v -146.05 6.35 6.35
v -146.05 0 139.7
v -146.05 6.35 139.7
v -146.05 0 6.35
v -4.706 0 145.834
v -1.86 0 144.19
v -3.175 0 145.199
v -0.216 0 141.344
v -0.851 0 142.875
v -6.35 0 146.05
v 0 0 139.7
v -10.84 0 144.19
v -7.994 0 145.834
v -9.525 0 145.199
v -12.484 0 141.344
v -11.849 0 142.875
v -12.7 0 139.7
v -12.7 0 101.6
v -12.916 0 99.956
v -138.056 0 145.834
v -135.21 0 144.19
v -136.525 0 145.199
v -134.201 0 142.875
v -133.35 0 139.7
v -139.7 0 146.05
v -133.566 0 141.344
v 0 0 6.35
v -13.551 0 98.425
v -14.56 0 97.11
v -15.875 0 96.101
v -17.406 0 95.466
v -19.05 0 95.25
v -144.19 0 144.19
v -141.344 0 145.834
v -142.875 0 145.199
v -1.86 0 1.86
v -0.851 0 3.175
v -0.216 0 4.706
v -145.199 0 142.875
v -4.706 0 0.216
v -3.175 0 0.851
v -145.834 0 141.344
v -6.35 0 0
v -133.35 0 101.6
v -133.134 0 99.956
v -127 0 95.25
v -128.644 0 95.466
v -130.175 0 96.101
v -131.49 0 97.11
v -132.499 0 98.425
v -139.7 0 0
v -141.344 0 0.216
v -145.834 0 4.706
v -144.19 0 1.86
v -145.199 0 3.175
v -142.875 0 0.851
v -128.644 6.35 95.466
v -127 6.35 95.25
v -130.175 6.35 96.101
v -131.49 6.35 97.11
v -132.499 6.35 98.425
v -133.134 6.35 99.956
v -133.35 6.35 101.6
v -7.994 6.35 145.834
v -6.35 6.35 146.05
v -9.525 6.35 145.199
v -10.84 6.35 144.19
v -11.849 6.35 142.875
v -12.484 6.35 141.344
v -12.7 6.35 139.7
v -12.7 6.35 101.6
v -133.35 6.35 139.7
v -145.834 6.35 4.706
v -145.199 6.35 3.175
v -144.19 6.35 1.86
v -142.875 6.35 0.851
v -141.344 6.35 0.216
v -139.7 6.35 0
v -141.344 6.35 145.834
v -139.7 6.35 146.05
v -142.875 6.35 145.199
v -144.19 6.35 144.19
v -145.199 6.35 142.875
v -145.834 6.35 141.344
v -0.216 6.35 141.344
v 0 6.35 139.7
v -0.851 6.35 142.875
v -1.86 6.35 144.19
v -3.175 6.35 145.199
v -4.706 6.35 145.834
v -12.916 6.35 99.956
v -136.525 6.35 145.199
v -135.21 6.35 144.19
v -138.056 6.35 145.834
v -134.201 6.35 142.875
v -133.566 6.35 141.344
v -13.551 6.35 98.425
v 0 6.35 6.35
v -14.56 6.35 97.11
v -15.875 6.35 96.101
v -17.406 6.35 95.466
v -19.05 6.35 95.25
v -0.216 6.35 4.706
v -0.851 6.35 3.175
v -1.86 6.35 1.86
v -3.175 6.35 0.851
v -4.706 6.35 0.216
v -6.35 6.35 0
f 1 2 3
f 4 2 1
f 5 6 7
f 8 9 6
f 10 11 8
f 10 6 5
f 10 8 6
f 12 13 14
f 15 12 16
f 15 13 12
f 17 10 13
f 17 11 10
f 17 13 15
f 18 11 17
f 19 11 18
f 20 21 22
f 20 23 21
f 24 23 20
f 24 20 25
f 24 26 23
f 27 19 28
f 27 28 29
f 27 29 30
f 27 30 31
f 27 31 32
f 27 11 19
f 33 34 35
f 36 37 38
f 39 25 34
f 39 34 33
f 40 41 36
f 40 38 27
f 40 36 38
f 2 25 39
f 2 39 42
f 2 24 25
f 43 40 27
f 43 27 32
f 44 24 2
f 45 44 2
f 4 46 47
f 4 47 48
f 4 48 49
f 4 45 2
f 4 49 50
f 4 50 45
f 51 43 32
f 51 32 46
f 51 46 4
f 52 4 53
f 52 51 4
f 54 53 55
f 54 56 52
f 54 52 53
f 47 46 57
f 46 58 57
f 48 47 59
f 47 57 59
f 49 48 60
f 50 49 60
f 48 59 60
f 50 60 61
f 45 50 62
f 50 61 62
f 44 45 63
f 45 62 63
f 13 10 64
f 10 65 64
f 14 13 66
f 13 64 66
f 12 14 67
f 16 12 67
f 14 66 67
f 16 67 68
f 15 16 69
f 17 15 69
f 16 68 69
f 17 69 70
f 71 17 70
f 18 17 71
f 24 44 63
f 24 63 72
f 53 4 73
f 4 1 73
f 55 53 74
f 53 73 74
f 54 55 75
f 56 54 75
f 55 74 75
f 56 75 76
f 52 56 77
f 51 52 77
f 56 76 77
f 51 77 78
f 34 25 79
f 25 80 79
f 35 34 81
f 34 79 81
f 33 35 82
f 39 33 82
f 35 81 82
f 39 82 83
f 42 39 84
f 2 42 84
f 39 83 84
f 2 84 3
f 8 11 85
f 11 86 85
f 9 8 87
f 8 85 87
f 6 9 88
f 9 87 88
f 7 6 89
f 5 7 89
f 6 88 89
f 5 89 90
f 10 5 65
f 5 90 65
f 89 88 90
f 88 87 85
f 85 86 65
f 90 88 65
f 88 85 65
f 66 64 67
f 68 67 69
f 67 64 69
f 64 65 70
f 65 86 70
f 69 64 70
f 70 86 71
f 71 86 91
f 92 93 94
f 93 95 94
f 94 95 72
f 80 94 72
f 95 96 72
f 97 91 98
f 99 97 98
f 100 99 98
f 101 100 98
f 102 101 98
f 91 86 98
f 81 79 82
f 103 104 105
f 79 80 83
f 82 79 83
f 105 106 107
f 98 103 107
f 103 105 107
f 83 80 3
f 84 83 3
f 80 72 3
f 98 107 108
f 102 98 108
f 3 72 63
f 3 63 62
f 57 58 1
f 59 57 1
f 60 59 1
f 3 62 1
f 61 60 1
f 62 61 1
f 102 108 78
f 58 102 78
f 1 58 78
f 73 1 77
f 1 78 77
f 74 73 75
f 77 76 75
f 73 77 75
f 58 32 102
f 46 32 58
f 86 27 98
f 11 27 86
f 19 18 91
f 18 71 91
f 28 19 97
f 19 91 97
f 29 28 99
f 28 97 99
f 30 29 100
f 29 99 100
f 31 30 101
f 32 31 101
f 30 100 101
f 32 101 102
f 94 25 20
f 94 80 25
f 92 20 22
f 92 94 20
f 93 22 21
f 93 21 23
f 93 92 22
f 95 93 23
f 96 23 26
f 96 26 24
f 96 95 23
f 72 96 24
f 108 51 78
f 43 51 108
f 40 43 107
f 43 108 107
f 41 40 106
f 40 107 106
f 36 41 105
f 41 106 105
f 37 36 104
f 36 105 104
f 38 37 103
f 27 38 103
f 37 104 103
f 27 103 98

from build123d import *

# Parameters (mm, degrees)
BOSS_EXTRUDE1_DEPTH = 6.35
FILLET1_R           = 6.35


with BuildPart() as part:
    # Sketch1 → Boss-Extrude1 (new body)
    with BuildSketch(Plane(origin=(0, 0, 0), x_dir=(1, 0, 0), z_dir=(0, 1, 0))):
        Polygon((-133.35, -146.05), (-146.05, -146.05), (-146.05, 0), (0, 0), (0, -146.05), (-12.7, -146.05), (-12.7, -95.25), (-133.35, -95.25), align=None)
    extrude(amount=BOSS_EXTRUDE1_DEPTH)

    # Fillet1
    fillet1_edges = [part.edges().sort_by_distance(p)[0] for p in [
        (-12.7, 3.175, 95.25),
        (-133.35, 3.175, 95.25),
        (0, 3.175, 146.05),
        (-146.05, 3.175, 0),
        (0, 3.175, 0),
        (-12.7, 3.175, 146.05),
        (-146.05, 3.175, 146.05),
        (-133.35, 3.175, 146.05),
    ]]
    fillet(fillet1_edges, radius=FILLET1_R - 0.0001)  # a hair under: the kernel refuses the full size


solid = part.part
